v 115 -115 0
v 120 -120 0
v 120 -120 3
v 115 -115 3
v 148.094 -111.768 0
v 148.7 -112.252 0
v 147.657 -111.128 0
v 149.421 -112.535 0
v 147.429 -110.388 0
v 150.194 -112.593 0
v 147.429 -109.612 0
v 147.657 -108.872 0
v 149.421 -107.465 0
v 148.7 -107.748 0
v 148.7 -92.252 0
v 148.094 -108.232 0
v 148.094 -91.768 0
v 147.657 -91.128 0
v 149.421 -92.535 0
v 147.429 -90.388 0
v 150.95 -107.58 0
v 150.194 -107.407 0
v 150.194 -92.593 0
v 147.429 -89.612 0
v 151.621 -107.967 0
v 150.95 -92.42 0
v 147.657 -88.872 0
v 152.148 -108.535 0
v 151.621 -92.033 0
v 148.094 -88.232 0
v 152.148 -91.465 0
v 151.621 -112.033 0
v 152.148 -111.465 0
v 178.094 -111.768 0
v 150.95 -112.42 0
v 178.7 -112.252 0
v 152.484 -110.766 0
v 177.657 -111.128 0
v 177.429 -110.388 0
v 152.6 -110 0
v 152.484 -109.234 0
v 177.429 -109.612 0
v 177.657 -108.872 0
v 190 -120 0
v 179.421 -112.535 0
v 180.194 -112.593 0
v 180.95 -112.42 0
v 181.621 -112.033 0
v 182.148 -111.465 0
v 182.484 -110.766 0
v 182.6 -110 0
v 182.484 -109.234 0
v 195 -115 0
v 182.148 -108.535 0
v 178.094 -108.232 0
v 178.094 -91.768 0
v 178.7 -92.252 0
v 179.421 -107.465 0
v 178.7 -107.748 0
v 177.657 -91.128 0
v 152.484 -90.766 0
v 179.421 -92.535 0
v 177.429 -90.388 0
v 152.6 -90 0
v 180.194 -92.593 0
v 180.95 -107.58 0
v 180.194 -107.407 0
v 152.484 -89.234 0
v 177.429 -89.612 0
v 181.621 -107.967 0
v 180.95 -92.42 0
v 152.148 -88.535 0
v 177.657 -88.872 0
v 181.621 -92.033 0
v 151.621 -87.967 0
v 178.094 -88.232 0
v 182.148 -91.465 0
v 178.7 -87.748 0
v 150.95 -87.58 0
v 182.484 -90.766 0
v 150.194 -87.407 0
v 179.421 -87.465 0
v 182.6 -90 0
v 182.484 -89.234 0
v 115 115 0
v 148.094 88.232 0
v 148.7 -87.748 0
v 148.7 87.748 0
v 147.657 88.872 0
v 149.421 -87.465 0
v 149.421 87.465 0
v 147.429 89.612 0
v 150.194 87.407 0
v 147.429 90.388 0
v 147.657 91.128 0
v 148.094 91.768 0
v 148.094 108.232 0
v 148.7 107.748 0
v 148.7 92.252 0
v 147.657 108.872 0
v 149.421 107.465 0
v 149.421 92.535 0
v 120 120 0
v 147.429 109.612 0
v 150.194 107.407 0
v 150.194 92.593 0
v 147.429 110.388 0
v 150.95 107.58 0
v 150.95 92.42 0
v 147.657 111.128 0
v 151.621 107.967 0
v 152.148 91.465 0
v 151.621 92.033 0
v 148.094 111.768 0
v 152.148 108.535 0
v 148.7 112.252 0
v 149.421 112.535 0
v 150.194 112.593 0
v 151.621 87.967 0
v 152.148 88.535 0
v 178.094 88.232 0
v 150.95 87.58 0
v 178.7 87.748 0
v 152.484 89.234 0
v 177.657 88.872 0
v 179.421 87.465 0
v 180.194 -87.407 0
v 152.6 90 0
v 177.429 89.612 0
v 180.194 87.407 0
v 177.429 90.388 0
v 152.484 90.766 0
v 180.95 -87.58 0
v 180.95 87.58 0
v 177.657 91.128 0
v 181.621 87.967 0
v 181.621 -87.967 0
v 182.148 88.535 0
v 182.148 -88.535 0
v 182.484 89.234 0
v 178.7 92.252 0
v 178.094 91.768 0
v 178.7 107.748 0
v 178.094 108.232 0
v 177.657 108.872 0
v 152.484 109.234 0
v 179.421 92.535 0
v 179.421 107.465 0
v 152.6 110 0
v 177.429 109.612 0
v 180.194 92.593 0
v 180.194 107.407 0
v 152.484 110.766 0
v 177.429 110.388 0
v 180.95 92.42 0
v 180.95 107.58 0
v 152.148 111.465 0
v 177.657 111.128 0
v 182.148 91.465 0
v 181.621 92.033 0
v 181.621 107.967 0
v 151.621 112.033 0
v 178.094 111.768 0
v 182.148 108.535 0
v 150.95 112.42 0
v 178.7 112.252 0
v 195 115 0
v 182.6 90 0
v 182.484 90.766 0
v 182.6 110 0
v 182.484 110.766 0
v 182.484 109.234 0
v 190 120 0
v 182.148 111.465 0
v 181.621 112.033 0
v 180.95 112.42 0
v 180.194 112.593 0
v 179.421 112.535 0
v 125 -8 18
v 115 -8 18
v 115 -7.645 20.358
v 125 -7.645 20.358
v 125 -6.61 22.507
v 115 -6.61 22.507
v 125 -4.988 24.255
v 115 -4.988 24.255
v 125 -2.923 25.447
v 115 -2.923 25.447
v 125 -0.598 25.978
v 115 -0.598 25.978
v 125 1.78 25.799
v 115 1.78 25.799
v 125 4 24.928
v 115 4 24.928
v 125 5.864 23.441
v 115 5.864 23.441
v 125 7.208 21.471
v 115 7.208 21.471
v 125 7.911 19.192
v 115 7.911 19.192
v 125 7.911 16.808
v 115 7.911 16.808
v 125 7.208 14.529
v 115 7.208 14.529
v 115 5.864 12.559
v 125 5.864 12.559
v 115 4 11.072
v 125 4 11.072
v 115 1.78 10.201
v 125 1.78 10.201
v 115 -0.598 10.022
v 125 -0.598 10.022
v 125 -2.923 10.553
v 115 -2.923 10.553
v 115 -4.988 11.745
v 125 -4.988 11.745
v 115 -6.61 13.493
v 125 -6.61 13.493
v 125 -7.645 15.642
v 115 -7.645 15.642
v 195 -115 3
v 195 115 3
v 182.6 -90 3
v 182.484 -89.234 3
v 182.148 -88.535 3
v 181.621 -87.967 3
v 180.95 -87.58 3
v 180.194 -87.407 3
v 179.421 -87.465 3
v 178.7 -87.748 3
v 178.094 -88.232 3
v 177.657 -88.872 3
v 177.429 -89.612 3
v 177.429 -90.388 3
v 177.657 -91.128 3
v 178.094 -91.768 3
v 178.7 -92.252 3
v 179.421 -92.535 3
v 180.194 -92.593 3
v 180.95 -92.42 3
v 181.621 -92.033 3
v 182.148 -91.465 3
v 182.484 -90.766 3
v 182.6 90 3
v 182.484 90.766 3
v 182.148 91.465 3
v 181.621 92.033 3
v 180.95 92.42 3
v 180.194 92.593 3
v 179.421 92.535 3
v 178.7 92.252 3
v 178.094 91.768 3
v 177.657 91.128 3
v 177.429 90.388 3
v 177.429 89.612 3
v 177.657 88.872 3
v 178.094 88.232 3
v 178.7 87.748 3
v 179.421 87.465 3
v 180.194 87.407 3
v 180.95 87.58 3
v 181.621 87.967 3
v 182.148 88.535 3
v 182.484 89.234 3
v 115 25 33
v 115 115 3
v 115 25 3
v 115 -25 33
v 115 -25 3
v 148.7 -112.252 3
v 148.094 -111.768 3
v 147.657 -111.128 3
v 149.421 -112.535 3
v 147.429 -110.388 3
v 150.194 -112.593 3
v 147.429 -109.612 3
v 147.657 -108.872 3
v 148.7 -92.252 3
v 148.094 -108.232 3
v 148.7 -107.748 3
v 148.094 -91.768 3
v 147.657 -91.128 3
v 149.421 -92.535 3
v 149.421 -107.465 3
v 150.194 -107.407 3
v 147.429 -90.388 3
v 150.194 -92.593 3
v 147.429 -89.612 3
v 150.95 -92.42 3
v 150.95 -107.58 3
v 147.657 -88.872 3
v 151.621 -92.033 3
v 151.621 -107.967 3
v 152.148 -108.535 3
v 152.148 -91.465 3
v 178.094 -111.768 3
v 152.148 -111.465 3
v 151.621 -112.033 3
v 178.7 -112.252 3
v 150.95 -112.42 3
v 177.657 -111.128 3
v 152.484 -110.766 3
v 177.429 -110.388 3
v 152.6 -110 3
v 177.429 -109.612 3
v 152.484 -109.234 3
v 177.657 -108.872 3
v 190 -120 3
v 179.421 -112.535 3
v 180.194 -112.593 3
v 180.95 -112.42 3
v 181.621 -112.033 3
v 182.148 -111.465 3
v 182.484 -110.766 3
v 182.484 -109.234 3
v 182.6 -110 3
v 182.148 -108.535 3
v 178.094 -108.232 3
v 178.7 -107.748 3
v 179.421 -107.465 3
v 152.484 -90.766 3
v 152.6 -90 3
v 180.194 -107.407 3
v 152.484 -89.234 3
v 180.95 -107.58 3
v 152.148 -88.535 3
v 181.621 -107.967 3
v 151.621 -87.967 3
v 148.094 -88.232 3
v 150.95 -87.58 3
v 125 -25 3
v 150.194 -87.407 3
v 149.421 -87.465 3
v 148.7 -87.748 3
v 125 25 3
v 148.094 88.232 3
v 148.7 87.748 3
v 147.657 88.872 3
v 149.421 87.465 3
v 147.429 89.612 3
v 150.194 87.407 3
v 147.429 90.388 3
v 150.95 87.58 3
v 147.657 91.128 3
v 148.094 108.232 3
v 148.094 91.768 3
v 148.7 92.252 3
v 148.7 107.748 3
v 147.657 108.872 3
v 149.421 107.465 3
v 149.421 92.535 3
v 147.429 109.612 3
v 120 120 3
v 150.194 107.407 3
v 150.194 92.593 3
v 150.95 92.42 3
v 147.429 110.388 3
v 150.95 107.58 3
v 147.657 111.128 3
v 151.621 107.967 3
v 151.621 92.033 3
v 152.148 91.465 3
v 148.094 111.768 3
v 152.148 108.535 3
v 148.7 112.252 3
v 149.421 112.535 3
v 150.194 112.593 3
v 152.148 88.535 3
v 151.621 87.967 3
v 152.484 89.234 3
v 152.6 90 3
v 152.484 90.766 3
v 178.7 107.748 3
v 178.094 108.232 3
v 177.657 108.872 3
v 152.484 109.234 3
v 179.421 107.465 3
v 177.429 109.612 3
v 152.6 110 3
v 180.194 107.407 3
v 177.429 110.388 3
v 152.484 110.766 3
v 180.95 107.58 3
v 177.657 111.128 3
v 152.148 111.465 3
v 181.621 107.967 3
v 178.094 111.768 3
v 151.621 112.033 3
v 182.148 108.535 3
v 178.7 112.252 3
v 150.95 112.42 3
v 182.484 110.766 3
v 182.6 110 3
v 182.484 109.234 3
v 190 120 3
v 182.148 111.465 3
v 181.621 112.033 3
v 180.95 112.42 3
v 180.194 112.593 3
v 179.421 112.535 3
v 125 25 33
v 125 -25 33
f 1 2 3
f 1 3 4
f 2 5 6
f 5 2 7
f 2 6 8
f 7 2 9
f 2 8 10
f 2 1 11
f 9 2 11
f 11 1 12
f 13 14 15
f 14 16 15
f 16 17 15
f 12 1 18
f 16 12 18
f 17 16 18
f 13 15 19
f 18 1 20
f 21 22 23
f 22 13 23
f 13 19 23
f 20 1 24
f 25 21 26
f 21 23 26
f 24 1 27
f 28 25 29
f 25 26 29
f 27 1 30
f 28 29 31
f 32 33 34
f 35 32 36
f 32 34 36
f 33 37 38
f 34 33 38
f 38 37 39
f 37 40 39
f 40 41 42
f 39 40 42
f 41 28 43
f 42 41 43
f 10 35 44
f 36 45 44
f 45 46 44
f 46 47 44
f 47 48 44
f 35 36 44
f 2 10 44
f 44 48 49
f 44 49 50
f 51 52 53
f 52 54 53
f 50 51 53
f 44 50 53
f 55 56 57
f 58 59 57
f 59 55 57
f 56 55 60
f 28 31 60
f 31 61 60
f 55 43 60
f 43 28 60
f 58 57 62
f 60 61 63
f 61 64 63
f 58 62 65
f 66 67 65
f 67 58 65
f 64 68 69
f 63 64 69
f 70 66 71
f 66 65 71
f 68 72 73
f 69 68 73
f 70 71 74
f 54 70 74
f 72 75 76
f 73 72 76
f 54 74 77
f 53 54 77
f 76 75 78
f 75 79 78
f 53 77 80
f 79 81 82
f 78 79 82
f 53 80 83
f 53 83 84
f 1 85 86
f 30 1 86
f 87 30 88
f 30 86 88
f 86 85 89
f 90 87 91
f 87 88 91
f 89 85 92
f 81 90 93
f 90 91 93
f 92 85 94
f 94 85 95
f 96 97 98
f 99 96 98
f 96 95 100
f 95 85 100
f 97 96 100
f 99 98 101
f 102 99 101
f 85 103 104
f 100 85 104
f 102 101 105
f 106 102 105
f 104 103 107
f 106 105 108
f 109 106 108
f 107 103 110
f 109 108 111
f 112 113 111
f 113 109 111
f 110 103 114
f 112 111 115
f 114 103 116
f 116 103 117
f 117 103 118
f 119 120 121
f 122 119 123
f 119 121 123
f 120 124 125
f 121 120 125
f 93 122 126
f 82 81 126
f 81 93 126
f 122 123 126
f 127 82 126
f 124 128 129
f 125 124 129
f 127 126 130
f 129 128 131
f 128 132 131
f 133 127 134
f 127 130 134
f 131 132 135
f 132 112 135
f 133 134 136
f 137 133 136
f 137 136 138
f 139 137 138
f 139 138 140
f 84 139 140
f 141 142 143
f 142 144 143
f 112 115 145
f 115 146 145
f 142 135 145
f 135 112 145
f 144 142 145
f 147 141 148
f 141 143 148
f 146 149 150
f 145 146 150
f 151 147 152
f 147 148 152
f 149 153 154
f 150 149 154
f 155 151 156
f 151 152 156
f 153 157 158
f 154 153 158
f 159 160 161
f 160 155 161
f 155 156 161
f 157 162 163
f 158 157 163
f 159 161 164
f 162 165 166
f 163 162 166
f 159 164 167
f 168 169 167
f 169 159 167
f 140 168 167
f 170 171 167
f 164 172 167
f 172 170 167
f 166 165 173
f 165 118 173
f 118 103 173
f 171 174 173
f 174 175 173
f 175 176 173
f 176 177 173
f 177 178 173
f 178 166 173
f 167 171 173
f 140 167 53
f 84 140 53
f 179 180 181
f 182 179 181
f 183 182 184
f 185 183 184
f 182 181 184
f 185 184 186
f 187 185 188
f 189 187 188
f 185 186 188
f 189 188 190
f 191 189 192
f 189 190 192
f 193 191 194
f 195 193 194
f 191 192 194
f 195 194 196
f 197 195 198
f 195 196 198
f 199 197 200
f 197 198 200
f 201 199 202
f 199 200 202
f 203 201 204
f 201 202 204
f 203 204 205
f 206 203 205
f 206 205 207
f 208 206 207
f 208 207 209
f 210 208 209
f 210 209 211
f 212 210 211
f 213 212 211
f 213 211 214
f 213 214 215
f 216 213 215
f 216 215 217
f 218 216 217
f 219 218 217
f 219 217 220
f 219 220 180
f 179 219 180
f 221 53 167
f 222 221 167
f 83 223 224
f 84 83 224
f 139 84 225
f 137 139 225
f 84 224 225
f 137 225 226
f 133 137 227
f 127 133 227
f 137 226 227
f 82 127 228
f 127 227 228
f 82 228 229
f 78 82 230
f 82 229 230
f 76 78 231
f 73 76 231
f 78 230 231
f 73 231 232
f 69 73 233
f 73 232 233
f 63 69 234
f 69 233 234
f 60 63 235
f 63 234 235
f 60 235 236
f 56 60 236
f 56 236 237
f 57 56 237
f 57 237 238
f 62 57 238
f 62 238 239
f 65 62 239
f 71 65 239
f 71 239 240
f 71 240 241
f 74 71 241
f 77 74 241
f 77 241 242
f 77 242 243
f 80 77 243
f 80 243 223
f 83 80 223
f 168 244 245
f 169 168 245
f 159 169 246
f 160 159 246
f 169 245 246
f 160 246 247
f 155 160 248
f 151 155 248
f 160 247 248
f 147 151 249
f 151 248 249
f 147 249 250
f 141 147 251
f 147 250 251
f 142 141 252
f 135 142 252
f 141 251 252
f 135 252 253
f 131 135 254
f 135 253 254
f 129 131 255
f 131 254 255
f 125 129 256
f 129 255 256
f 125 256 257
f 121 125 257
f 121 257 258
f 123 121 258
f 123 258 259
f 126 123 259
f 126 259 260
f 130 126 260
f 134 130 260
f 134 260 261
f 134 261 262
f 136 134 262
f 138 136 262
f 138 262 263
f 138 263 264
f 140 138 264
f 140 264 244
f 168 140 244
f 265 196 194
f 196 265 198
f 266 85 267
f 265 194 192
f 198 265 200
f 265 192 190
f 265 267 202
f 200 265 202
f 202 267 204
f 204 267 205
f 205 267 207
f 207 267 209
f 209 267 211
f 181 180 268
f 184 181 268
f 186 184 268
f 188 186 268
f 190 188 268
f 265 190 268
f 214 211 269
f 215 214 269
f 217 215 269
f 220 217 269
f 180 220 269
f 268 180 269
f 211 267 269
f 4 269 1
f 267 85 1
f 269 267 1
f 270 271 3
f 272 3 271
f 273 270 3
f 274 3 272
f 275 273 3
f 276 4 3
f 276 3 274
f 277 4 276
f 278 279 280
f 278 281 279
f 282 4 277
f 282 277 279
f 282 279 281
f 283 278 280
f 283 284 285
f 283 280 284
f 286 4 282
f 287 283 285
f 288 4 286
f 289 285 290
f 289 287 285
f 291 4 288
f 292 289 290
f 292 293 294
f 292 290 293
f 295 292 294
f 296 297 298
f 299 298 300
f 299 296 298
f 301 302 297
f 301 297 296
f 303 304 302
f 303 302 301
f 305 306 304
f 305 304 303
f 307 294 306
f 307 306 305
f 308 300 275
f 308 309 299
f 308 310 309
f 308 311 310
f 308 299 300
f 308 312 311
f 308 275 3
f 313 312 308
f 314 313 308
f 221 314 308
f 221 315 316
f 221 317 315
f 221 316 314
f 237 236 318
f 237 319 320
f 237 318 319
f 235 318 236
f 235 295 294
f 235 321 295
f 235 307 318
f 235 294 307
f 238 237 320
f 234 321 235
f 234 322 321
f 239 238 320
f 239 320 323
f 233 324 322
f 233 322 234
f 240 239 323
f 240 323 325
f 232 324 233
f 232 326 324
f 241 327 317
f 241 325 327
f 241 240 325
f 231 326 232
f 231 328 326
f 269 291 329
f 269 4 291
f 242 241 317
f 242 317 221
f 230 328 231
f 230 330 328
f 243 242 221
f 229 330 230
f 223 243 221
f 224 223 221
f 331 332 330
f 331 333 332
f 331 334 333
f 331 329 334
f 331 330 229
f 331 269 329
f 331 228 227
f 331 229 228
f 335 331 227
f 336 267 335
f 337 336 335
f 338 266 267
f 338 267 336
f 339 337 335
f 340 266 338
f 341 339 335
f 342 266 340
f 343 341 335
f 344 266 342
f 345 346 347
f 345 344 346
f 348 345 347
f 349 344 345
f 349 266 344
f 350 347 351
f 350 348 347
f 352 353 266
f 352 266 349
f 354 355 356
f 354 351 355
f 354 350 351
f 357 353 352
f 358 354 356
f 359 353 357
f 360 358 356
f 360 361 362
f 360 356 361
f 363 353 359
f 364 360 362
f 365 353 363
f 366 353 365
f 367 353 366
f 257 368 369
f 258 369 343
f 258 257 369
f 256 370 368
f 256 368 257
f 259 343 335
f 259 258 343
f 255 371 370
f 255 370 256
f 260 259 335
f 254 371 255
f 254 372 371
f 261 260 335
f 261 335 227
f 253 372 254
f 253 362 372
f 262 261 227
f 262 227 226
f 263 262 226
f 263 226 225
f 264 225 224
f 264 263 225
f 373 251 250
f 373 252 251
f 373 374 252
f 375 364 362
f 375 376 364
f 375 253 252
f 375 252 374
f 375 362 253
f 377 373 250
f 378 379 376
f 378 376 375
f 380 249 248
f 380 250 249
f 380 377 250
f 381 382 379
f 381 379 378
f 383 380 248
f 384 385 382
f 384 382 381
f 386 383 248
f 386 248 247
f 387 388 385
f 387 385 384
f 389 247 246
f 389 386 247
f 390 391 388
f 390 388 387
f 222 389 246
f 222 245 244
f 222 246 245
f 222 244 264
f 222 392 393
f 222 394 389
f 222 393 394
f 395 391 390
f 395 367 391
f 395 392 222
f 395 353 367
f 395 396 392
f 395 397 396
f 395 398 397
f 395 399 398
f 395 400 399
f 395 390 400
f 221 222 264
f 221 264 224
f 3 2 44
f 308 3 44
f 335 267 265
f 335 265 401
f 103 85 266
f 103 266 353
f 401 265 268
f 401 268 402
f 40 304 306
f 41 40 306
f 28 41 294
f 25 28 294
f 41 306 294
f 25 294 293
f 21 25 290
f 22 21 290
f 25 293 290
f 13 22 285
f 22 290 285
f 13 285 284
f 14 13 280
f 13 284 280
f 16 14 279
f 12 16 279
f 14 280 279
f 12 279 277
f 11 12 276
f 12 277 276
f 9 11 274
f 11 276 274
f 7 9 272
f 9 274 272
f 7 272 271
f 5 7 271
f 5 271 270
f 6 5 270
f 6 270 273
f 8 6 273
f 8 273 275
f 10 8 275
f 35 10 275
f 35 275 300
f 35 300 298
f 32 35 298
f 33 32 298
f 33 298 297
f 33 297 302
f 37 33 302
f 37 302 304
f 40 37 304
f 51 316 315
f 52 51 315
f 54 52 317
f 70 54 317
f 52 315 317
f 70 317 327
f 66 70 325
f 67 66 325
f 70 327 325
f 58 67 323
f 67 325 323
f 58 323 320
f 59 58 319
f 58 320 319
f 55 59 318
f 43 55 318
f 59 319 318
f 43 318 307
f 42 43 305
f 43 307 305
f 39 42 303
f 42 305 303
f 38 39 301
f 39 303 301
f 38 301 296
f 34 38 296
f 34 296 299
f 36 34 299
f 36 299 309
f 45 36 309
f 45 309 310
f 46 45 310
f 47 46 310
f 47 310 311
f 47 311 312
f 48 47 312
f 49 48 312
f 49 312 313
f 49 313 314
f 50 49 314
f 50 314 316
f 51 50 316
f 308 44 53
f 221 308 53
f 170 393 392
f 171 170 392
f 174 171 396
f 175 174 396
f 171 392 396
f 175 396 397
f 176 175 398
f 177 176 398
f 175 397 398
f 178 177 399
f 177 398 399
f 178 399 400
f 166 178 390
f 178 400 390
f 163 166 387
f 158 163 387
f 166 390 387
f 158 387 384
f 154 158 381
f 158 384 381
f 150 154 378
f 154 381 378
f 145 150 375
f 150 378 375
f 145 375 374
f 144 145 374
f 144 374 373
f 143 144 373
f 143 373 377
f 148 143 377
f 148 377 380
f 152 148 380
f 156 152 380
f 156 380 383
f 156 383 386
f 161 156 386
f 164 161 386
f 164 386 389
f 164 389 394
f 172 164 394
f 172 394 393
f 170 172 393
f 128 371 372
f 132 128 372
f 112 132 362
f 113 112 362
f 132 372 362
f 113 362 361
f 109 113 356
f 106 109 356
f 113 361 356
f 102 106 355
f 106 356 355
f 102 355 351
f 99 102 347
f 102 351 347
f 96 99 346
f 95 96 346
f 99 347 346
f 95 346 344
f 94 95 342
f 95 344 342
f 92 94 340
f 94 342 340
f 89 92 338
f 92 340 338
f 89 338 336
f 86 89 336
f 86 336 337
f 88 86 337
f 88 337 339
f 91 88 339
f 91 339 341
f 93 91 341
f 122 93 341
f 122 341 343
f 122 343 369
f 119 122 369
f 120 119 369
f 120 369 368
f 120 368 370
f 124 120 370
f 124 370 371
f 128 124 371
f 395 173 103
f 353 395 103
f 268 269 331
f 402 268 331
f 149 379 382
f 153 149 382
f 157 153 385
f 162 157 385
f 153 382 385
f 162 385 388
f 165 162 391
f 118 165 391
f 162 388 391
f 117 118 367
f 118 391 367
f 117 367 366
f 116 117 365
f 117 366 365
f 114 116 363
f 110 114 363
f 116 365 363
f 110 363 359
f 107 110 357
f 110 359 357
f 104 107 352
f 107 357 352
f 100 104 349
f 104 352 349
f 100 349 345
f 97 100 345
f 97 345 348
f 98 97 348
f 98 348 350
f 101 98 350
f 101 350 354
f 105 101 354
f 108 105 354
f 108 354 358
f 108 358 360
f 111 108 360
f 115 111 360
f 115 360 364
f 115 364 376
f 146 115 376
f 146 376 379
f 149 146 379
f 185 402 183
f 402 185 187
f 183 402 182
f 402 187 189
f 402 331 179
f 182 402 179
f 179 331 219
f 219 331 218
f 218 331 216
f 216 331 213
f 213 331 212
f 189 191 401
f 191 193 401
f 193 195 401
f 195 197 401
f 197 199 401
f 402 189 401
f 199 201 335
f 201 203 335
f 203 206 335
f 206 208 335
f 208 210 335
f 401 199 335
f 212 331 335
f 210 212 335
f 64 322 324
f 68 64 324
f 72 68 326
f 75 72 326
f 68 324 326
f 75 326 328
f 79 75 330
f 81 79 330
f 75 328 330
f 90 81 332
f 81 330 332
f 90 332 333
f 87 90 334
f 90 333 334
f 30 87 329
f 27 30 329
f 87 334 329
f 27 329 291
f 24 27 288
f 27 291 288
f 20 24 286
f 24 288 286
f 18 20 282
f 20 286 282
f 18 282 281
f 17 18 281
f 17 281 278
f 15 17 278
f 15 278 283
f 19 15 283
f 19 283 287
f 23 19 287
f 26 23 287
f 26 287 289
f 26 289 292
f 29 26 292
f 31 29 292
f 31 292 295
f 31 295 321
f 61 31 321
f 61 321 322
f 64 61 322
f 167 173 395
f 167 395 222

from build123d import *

# Parameters (mm, degrees)
SKETCH_1_R          = 3
SKETCH_1_W          = 90
SKETCH_1_H          = 120
SKETCH_1_R_2        = 10
SKETCH_1_R_3        = 7.5
EXTRUDE_2_DEPTH     = 3
EXTRUDE_START       = -3
SKETCH_2_R          = 10
SKETCH_2_R_2        = 7.5
EXTRUDE_3_DEPTH     = 3
CUT_EXTRUDE_START   = -3
SKETCH_3_R          = 3
SKETCH_3_W          = 90
SKETCH_3_H          = 120
CUT_EXTRUDE_2_DEPTH = 3
SKETCH_4_W          = 10
SKETCH_4_H          = 50
EXTRUDE_4_DEPTH     = 30
SKETCH_5_R          = 8
CUT_EXTRUDE_3_DEPTH = 30
SKETCH_6_R          = 2.6
CUT_EXTRUDE_5_DEPTH = 10


with BuildPart() as part:
    # 草图1 → 凸台-拉伸2 (new body)
    # profile 1 of 9: a face of its own
    with BuildSketch(Plane.XY):
        Polygon((195, -115), (195, 115), (190, 115), (190, 120), (115, 120), (115, 75), (75, 75), (-90, 75), (-130, 75), (-130, 120), (-175, 120), (-175, 90), (-195, 90), (-195, -90), (-175, -90), (-175, -120), (-130, -120), (-130, -75), (-90, -75), (75, -75), (115, -75), (115, -120), (190, -120), (190, -115), align=None)
        with Locations((-184.089468205, -70)):
            Circle(SKETCH_1_R, mode=Mode.SUBTRACT)
        with Locations((-87, -69)):
            Circle(SKETCH_1_R, mode=Mode.SUBTRACT)
        with Locations((-184.089468205, 70)):
            Circle(SKETCH_1_R, mode=Mode.SUBTRACT)
        with Locations((-87, 69)):
            Circle(SKETCH_1_R, mode=Mode.SUBTRACT)
        Rectangle(SKETCH_1_W, SKETCH_1_H, mode=Mode.SUBTRACT)
        with Locations((75, 0)):
            Circle(SKETCH_1_R_2, mode=Mode.SUBTRACT)
        with Locations((117.5, 0)):
            Circle(SKETCH_1_R_3, mode=Mode.SUBTRACT)
    # profile 2 of 9: a face of its own
    with BuildSketch(Plane.XY):
        Polygon((-130, 120), (-90, 75), (-130, 75), align=None)
    # profile 3 of 9: a face of its own
    with BuildSketch(Plane.XY):
        Polygon((-175, 120), (-175, 90), (-195, 90), align=None)
    # profile 4 of 9: a face of its own
    with BuildSketch(Plane.XY):
        Polygon((-175, -120), (-195, -90), (-175, -90), align=None)
    # profile 5 of 9: a face of its own
    with BuildSketch(Plane.XY):
        Polygon((-130, -120), (-130, -75), (-90, -75), align=None)
    # profile 6 of 9: a face of its own
    with BuildSketch(Plane.XY):
        Polygon((115, -120), (75, -75), (115, -75), align=None)
        with Locations((104.379549532, -93)):
            Circle(SKETCH_1_R, mode=Mode.SUBTRACT)
    # profile 7 of 9: a face of its own
    with BuildSketch(Plane.XY):
        Polygon((115, 120), (115, 75), (75, 75), align=None)
        with Locations((104.379549532, 93)):
            Circle(SKETCH_1_R, mode=Mode.SUBTRACT)
    # profile 8 of 9: a face of its own
    with BuildSketch(Plane.XY):
        Polygon((190, 120), (195, 115), (190, 115), align=None)
    # profile 9 of 9: a face of its own
    with BuildSketch(Plane.XY):
        Polygon((190, -115), (190, -120), (195, -115), align=None)
    extrude(amount=EXTRUDE_2_DEPTH)

    # 草图2 → 凸台-拉伸3 (add)
    with BuildSketch(Plane.XY.offset(3).offset(EXTRUDE_START)):
        with Locations((75, 0)):
            Circle(SKETCH_2_R)
        with Locations((117.5, 0)):
            Circle(SKETCH_2_R_2)
    extrude(amount=EXTRUDE_3_DEPTH)

    # 草图3 → 切除-拉伸2 (cut)
    # profile 1 of 3: a face of its own
    with BuildSketch(Plane.XY.offset(3).offset(CUT_EXTRUDE_START)):
        Polygon((115, 120), (115, -120), (75, -75), (-90, -75), (-130, -120), (-175, -120), (-195, -90), (-195, 90), (-175, 120), (-130, 120), (-90, 75), (75, 75), align=None)
        with Locations((-184.089468205, -70)):
            Circle(SKETCH_3_R, mode=Mode.SUBTRACT)
        with Locations((-87, 69)):
            Circle(SKETCH_3_R, mode=Mode.SUBTRACT)
        with Locations((104.379549532, 93)):
            Circle(SKETCH_3_R, mode=Mode.SUBTRACT)
        with Locations((104.379549532, -93)):
            Circle(SKETCH_3_R, mode=Mode.SUBTRACT)
        with Locations((-87, -69)):
            Circle(SKETCH_3_R, mode=Mode.SUBTRACT)
        with Locations((-184.089468205, 70)):
            Circle(SKETCH_3_R, mode=Mode.SUBTRACT)
        Rectangle(SKETCH_3_W, SKETCH_3_H, mode=Mode.SUBTRACT)
    # profile 2 of 3: a face of its own
    with BuildSketch(Plane.XY.offset(3).offset(CUT_EXTRUDE_START)):
        Polygon((120, -120), (115, -115), (115, -120), align=None)
    # profile 3 of 3: a face of its own
    with BuildSketch(Plane.XY.offset(3).offset(CUT_EXTRUDE_START)):
        Polygon((120, 120), (115, 120), (115, 115), align=None)
    extrude(amount=CUT_EXTRUDE_2_DEPTH, mode=Mode.SUBTRACT)

    # 草图4 → 凸台-拉伸4 (add)
    with BuildSketch(Plane.XY.offset(3)):
        with Locations((120, 0)):
            Rectangle(SKETCH_4_W, SKETCH_4_H)
    extrude(amount=EXTRUDE_4_DEPTH)

    # 草图5 → 切除-拉伸3 (cut)
    with BuildSketch(Plane.ZY.offset(-115)):
        with Locations(Location((18, 0, 0), (0, 0, 270))):
            Circle(SKETCH_5_R)
    extrude(amount=-CUT_EXTRUDE_3_DEPTH, mode=Mode.SUBTRACT)

    # 草图6 → 切除-拉伸5 (cut)
    with BuildSketch(Plane.XY.offset(3)):
        with Locations((150, 90)):
            Circle(SKETCH_6_R)
        with Locations((180, 90)):
            Circle(SKETCH_6_R)
        with Locations((180, 110)):
            Circle(SKETCH_6_R)
        with Locations((150, 110)):
            Circle(SKETCH_6_R)
        with Locations((150, -90)):
            Circle(SKETCH_6_R)
        with Locations((150, -110)):
            Circle(SKETCH_6_R)
        with Locations((180, -110)):
            Circle(SKETCH_6_R)
        with Locations((180, -90)):
            Circle(SKETCH_6_R)
    extrude(amount=-CUT_EXTRUDE_5_DEPTH, mode=Mode.SUBTRACT)


solid = part.part
